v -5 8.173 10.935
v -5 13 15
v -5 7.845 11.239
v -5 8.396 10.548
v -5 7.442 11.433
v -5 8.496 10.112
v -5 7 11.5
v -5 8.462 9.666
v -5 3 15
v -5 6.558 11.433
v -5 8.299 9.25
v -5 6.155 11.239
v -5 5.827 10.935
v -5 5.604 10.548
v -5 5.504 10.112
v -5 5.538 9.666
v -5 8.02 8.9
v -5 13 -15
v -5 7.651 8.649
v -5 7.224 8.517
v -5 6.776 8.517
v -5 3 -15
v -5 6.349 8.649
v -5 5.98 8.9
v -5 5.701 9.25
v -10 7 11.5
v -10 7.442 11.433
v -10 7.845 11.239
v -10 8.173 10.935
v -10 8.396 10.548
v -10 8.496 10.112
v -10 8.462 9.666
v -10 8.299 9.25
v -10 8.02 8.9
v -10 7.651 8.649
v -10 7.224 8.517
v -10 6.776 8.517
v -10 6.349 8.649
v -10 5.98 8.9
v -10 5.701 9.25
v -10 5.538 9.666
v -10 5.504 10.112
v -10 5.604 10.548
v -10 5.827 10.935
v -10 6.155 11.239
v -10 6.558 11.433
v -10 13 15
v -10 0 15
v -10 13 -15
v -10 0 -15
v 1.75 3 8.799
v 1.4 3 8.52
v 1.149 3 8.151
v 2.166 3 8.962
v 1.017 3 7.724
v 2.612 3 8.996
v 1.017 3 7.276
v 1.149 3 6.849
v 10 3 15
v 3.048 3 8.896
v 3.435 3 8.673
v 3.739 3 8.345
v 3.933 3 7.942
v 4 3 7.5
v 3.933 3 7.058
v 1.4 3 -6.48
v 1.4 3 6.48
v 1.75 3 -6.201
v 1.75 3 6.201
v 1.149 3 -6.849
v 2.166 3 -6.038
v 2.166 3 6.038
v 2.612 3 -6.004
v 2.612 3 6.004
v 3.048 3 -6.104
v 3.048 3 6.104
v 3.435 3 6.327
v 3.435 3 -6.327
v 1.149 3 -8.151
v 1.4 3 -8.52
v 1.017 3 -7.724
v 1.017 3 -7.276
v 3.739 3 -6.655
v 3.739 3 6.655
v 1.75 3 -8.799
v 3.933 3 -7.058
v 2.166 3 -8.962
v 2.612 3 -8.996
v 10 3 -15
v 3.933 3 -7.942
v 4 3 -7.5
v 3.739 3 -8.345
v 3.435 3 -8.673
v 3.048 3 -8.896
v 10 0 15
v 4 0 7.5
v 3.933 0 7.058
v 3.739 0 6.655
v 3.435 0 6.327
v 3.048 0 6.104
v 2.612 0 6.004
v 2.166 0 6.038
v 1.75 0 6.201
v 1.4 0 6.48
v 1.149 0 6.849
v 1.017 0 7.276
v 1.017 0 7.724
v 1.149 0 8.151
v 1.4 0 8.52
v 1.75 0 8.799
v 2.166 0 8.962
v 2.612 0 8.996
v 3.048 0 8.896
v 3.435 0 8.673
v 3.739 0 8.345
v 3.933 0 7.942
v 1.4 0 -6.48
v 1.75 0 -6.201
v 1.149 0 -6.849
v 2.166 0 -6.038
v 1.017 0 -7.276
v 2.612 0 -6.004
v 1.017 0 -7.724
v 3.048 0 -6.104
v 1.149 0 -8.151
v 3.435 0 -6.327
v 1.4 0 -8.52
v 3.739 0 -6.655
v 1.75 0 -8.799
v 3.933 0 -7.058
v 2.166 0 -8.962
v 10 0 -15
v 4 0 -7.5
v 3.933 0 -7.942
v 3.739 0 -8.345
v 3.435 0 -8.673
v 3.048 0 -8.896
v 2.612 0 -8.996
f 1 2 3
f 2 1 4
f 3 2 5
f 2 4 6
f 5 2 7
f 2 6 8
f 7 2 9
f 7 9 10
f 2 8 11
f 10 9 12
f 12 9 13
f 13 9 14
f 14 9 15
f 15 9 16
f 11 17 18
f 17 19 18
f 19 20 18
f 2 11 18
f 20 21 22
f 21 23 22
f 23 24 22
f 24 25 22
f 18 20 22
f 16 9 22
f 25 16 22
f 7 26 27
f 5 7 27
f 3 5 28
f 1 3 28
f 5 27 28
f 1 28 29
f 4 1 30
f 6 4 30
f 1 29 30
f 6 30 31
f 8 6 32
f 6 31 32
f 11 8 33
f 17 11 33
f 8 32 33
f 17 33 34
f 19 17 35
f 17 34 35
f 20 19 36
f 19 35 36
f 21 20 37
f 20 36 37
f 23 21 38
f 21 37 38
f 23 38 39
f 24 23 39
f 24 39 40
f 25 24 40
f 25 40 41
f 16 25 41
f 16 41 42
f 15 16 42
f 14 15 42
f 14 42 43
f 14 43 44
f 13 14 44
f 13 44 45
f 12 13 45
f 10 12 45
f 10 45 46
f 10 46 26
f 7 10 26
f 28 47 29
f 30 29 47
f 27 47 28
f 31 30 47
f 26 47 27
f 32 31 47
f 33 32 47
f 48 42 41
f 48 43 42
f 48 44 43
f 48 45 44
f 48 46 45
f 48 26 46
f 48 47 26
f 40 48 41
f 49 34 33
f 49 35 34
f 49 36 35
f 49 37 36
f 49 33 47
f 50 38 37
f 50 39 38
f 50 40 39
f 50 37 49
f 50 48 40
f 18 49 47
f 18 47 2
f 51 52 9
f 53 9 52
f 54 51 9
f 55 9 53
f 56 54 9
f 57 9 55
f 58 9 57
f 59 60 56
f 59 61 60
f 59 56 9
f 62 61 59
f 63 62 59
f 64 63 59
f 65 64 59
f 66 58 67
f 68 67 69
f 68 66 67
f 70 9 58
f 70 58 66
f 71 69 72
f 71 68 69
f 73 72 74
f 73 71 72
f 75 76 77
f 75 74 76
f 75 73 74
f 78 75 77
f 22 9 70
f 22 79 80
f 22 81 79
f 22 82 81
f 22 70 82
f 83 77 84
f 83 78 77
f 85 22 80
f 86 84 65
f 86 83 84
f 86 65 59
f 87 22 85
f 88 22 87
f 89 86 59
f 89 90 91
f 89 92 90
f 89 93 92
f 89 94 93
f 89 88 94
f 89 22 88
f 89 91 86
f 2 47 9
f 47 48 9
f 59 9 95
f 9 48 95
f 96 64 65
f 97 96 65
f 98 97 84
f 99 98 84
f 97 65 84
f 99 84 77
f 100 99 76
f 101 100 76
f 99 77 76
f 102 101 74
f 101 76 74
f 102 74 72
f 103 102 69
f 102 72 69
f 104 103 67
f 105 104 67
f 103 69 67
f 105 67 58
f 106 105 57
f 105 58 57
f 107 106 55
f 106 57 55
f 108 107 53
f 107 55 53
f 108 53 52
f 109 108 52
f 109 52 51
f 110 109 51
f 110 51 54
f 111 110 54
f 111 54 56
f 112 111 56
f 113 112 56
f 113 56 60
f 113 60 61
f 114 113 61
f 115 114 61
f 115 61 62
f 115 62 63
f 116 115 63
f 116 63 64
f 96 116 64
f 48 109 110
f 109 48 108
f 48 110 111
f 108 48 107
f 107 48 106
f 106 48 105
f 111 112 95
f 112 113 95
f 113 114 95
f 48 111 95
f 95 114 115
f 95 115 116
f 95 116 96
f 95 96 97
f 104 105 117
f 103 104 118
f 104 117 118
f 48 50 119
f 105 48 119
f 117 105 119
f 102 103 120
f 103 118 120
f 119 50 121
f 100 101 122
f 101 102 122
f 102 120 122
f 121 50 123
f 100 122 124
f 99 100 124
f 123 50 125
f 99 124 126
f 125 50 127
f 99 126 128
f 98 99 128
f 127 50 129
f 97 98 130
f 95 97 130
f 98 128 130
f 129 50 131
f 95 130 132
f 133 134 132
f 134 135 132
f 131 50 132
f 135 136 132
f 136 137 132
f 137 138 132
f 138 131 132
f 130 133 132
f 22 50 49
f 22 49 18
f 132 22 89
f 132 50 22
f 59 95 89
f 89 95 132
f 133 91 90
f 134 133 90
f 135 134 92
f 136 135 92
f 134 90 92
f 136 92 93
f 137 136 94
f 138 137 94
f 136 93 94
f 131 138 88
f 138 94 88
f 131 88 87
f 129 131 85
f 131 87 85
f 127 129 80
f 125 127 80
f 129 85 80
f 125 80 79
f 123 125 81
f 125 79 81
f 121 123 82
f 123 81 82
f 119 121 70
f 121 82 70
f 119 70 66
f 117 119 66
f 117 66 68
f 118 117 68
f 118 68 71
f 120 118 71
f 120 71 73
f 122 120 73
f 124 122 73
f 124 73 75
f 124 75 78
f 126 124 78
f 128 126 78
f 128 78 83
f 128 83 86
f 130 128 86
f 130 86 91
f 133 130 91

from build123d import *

# Parameters (mm, degrees)
SKETCH1_W           = 20
SKETCH1_H           = 30
BOSS_EXTRUDE1_DEPTH = 3
SKETCH2_W           = 5
SKETCH2_H           = 30
BOSS_EXTRUDE2_DEPTH = 10
SKETCH3_R           = 1.5
CUT_EXTRUDE1_DEPTH  = 10
SKETCH4_R           = 1.5
CUT_EXTRUDE2_DEPTH  = 4


with BuildPart() as part:
    # Sketch1 → Boss-Extrude1 (new body)
    with BuildSketch(Plane(origin=(0, 0, 0), x_dir=(1, 0, 0), z_dir=(0, 1, 0))):
        Rectangle(SKETCH1_W, SKETCH1_H)
    extrude(amount=BOSS_EXTRUDE1_DEPTH)

    # Sketch2 → Boss-Extrude2 (add)
    with BuildSketch(Plane(origin=(0, 3, 0), x_dir=(1, 0, 0), z_dir=(0, 1, 0))):
        with Locations((-7.5, 0)):
            Rectangle(SKETCH2_W, SKETCH2_H)
    extrude(amount=BOSS_EXTRUDE2_DEPTH)

    # Sketch3 → Cut-Extrude1 (cut)
    with BuildSketch(Plane.ZY.offset(10)):
        with Locations((10, 7)):
            Circle(SKETCH3_R)
    extrude(amount=-CUT_EXTRUDE1_DEPTH, mode=Mode.SUBTRACT)

    # Sketch4 → Cut-Extrude2 (cut, through all)
    with BuildSketch(Plane(origin=(0, 3, 0), x_dir=(1, 0, 0), z_dir=(0, 1, 0))):
        with Locations((2.5, -7.5)):
            Circle(SKETCH4_R)
        with Locations((2.5, 7.5)):
            Circle(SKETCH4_R)
    extrude(amount=-CUT_EXTRUDE2_DEPTH, mode=Mode.SUBTRACT)


solid = part.part
